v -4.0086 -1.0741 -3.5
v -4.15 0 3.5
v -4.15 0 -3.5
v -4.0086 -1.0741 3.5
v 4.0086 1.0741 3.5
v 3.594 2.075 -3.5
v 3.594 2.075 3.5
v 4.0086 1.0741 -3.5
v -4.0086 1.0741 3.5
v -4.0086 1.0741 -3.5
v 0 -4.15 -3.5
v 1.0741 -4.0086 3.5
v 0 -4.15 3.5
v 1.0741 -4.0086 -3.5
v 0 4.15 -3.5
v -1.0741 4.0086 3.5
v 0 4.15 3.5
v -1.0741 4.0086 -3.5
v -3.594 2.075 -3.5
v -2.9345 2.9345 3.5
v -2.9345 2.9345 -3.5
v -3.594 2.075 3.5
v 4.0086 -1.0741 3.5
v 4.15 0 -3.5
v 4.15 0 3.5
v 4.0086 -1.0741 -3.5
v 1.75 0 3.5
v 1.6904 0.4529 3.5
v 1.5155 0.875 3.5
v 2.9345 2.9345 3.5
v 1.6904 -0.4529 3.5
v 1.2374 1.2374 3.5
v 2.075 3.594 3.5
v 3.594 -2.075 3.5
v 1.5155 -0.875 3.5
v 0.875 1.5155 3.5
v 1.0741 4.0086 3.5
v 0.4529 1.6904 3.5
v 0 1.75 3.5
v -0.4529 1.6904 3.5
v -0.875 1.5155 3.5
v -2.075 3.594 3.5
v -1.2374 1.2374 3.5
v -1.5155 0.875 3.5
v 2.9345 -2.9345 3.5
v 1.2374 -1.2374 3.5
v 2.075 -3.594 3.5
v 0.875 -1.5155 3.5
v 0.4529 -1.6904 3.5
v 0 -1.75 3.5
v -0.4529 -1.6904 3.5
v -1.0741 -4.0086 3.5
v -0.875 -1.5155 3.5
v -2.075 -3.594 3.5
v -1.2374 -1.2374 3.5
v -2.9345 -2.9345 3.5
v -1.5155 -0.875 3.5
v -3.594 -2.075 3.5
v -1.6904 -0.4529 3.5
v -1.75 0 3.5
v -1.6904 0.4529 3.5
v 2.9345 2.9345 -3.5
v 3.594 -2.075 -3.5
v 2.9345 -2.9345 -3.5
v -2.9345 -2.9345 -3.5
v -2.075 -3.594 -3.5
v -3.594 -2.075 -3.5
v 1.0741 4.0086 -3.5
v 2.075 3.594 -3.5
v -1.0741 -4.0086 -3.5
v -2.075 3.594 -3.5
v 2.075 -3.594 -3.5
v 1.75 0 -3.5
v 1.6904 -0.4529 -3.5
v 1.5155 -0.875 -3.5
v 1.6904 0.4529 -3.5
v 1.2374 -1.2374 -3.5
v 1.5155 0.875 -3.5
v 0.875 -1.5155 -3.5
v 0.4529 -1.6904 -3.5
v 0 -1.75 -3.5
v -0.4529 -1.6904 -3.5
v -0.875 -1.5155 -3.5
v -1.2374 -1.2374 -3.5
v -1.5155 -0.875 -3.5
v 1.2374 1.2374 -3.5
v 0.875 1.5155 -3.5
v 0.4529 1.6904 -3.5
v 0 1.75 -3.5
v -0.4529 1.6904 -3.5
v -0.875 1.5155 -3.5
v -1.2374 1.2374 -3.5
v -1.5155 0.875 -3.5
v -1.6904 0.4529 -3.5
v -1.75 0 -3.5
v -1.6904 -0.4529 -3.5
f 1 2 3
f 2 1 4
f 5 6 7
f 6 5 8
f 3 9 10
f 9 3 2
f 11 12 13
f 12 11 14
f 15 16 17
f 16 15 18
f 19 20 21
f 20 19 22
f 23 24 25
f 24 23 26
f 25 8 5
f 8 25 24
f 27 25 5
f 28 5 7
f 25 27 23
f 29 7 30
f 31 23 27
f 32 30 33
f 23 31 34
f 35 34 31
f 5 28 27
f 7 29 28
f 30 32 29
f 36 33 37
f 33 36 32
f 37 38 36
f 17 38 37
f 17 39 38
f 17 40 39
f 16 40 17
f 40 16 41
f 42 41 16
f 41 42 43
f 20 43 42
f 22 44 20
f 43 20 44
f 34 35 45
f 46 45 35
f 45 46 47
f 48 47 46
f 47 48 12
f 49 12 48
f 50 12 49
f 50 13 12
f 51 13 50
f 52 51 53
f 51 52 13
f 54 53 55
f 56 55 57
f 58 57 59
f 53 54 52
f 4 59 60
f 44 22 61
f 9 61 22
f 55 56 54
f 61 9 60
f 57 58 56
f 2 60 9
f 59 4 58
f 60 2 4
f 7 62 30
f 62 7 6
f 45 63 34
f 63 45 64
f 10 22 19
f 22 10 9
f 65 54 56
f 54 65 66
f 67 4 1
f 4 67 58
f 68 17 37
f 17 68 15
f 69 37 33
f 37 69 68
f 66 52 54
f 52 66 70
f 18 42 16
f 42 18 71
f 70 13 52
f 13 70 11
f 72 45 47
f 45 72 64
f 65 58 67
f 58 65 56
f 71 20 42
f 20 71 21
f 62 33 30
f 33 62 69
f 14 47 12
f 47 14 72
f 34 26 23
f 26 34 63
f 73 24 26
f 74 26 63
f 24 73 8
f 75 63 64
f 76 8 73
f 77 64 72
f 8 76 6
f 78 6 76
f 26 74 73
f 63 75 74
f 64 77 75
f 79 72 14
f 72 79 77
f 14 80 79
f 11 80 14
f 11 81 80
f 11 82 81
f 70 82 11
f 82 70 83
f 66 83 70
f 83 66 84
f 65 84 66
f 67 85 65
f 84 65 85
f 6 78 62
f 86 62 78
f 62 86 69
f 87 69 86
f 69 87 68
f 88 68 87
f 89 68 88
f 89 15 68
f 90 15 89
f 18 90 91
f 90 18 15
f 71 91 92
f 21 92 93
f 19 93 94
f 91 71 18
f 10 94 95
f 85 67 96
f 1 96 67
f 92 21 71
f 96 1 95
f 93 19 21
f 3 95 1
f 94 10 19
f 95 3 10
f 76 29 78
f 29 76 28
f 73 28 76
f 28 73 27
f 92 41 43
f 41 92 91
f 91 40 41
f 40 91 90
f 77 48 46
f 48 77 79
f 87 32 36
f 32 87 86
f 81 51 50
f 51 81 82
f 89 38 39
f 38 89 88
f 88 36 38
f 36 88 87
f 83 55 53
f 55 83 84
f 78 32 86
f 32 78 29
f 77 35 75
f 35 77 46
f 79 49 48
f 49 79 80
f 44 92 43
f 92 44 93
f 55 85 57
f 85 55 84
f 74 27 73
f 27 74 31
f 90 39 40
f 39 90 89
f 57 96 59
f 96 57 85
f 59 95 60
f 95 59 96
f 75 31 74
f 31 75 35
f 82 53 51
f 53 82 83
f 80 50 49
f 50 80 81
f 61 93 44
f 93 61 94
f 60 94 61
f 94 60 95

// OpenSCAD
module stand_cyl
(
	line_wd=0.4,
	lines_cnt=6,
	out_diam_extra=0.0,
	inner_diam=3.5,
	height=7,
	quality=2,
)
{
	outer_diam=inner_diam+line_wd*lines_cnt*2+out_diam_extra;
	difference()
	{
		cylinder(h=height,d=outer_diam,center=true,$fn=quality*12);
		cylinder(h=height+1,d=inner_diam,center=true,$fn=quality*12);
	}
}

stand_cyl();
